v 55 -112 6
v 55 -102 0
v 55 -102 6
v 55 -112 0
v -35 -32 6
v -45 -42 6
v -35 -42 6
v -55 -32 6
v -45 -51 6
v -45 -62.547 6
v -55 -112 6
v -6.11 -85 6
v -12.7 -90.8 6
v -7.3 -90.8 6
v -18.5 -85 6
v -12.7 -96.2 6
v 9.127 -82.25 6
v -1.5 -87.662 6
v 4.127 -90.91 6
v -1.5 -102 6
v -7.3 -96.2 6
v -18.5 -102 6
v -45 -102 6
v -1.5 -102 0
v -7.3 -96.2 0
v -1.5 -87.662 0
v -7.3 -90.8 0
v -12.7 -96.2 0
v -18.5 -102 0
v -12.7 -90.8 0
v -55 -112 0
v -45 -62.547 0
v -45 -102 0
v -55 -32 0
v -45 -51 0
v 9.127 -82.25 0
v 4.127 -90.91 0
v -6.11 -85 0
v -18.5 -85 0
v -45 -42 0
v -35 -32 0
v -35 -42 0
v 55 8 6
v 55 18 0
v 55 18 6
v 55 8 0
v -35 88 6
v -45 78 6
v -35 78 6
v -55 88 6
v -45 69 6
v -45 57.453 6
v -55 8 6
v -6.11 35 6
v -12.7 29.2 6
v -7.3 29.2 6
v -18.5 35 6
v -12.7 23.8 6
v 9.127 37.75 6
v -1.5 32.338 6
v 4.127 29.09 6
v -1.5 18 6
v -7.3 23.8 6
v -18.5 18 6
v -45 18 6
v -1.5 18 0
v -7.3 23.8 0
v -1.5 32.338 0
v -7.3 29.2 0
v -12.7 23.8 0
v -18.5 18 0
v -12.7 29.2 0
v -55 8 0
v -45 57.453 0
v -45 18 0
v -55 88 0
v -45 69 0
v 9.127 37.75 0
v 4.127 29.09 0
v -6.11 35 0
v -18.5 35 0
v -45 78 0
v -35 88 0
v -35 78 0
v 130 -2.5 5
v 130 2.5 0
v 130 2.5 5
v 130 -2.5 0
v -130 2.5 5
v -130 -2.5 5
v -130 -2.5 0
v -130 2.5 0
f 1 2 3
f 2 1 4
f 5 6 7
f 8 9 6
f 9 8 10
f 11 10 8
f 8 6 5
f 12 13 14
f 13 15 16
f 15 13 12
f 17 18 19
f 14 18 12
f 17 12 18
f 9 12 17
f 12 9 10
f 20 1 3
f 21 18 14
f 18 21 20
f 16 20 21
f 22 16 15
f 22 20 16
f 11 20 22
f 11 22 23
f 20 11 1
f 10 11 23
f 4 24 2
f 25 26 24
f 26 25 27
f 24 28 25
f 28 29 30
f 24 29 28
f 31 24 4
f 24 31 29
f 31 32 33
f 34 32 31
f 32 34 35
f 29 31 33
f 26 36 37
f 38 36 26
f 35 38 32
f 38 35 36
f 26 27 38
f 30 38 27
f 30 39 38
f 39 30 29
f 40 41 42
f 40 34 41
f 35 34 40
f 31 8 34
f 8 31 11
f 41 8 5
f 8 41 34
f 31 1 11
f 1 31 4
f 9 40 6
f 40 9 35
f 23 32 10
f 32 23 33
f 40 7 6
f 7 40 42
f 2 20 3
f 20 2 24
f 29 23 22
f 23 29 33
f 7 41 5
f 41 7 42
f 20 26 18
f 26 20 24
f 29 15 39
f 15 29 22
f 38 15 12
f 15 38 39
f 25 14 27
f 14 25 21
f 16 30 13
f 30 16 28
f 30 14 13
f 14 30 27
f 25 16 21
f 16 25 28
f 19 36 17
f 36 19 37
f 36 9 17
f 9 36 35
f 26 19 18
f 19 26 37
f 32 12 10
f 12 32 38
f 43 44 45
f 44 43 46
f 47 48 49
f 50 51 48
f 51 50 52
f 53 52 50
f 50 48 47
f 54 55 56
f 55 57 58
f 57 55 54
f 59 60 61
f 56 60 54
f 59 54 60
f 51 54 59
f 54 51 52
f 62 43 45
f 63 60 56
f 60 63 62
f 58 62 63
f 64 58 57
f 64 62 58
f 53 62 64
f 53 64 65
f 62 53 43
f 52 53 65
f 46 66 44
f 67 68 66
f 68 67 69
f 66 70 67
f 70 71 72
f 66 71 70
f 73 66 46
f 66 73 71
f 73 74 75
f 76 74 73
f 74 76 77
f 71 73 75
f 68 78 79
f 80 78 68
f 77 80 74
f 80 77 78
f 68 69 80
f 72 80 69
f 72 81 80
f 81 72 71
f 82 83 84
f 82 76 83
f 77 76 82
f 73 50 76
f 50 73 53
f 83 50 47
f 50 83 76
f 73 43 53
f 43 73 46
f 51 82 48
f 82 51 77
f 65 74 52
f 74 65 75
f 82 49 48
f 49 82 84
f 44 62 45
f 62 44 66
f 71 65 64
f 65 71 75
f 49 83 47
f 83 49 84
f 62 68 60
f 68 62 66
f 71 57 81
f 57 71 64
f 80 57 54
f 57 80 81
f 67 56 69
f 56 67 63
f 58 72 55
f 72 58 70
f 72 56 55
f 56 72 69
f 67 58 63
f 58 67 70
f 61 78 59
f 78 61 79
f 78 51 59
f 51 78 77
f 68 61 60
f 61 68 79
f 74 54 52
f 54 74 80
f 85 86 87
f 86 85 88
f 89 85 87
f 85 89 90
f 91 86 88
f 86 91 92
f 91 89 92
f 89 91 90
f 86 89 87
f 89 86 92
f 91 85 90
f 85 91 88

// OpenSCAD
$fn=50;
ts=6;

ln=260;
stk=[100,60,10];
dd=0.4;
ro=5;

lop=stk.x/1.6;

 translate([0,-stk.y ,0]) all1();
  translate([0,stk.y ,0]) all1();
line();



module all1(){
    translate([0,-stk.y/2+18 ,0]) all();
    translate([-stk.x/2+stk.z/2,9,0])rotate([0,0,-30])translate([lop/2,-stk.z/2,ts/2])cube([lop,stk.z, ts],true);
}

module all(){
    
    difference(){
        translate([0,0,ts/2])cube([stk.x+stk.z,stk.y+stk.z*2, ts],true);
        translate([stk.z,0,ts/2])cube([stk.x+stk.z,stk.y, ts*3],true);
        translate([stk.z*2,stk.z*2,ts/2])cube([stk.x+stk.z,stk.y, ts*3],true);
    }
    translate([-stk.z,-stk.y/2+(ro+2*ts)/2,ts/2])difference(){
        cube([ro+2*ts,ro+2*ts, ts],true);
        cube([ro+dd,ro+dd, ts*3],true);
    }
}    
    



module line(){
    translate([0,0,ro/2])cube([ln,ro, ro],true);
}
